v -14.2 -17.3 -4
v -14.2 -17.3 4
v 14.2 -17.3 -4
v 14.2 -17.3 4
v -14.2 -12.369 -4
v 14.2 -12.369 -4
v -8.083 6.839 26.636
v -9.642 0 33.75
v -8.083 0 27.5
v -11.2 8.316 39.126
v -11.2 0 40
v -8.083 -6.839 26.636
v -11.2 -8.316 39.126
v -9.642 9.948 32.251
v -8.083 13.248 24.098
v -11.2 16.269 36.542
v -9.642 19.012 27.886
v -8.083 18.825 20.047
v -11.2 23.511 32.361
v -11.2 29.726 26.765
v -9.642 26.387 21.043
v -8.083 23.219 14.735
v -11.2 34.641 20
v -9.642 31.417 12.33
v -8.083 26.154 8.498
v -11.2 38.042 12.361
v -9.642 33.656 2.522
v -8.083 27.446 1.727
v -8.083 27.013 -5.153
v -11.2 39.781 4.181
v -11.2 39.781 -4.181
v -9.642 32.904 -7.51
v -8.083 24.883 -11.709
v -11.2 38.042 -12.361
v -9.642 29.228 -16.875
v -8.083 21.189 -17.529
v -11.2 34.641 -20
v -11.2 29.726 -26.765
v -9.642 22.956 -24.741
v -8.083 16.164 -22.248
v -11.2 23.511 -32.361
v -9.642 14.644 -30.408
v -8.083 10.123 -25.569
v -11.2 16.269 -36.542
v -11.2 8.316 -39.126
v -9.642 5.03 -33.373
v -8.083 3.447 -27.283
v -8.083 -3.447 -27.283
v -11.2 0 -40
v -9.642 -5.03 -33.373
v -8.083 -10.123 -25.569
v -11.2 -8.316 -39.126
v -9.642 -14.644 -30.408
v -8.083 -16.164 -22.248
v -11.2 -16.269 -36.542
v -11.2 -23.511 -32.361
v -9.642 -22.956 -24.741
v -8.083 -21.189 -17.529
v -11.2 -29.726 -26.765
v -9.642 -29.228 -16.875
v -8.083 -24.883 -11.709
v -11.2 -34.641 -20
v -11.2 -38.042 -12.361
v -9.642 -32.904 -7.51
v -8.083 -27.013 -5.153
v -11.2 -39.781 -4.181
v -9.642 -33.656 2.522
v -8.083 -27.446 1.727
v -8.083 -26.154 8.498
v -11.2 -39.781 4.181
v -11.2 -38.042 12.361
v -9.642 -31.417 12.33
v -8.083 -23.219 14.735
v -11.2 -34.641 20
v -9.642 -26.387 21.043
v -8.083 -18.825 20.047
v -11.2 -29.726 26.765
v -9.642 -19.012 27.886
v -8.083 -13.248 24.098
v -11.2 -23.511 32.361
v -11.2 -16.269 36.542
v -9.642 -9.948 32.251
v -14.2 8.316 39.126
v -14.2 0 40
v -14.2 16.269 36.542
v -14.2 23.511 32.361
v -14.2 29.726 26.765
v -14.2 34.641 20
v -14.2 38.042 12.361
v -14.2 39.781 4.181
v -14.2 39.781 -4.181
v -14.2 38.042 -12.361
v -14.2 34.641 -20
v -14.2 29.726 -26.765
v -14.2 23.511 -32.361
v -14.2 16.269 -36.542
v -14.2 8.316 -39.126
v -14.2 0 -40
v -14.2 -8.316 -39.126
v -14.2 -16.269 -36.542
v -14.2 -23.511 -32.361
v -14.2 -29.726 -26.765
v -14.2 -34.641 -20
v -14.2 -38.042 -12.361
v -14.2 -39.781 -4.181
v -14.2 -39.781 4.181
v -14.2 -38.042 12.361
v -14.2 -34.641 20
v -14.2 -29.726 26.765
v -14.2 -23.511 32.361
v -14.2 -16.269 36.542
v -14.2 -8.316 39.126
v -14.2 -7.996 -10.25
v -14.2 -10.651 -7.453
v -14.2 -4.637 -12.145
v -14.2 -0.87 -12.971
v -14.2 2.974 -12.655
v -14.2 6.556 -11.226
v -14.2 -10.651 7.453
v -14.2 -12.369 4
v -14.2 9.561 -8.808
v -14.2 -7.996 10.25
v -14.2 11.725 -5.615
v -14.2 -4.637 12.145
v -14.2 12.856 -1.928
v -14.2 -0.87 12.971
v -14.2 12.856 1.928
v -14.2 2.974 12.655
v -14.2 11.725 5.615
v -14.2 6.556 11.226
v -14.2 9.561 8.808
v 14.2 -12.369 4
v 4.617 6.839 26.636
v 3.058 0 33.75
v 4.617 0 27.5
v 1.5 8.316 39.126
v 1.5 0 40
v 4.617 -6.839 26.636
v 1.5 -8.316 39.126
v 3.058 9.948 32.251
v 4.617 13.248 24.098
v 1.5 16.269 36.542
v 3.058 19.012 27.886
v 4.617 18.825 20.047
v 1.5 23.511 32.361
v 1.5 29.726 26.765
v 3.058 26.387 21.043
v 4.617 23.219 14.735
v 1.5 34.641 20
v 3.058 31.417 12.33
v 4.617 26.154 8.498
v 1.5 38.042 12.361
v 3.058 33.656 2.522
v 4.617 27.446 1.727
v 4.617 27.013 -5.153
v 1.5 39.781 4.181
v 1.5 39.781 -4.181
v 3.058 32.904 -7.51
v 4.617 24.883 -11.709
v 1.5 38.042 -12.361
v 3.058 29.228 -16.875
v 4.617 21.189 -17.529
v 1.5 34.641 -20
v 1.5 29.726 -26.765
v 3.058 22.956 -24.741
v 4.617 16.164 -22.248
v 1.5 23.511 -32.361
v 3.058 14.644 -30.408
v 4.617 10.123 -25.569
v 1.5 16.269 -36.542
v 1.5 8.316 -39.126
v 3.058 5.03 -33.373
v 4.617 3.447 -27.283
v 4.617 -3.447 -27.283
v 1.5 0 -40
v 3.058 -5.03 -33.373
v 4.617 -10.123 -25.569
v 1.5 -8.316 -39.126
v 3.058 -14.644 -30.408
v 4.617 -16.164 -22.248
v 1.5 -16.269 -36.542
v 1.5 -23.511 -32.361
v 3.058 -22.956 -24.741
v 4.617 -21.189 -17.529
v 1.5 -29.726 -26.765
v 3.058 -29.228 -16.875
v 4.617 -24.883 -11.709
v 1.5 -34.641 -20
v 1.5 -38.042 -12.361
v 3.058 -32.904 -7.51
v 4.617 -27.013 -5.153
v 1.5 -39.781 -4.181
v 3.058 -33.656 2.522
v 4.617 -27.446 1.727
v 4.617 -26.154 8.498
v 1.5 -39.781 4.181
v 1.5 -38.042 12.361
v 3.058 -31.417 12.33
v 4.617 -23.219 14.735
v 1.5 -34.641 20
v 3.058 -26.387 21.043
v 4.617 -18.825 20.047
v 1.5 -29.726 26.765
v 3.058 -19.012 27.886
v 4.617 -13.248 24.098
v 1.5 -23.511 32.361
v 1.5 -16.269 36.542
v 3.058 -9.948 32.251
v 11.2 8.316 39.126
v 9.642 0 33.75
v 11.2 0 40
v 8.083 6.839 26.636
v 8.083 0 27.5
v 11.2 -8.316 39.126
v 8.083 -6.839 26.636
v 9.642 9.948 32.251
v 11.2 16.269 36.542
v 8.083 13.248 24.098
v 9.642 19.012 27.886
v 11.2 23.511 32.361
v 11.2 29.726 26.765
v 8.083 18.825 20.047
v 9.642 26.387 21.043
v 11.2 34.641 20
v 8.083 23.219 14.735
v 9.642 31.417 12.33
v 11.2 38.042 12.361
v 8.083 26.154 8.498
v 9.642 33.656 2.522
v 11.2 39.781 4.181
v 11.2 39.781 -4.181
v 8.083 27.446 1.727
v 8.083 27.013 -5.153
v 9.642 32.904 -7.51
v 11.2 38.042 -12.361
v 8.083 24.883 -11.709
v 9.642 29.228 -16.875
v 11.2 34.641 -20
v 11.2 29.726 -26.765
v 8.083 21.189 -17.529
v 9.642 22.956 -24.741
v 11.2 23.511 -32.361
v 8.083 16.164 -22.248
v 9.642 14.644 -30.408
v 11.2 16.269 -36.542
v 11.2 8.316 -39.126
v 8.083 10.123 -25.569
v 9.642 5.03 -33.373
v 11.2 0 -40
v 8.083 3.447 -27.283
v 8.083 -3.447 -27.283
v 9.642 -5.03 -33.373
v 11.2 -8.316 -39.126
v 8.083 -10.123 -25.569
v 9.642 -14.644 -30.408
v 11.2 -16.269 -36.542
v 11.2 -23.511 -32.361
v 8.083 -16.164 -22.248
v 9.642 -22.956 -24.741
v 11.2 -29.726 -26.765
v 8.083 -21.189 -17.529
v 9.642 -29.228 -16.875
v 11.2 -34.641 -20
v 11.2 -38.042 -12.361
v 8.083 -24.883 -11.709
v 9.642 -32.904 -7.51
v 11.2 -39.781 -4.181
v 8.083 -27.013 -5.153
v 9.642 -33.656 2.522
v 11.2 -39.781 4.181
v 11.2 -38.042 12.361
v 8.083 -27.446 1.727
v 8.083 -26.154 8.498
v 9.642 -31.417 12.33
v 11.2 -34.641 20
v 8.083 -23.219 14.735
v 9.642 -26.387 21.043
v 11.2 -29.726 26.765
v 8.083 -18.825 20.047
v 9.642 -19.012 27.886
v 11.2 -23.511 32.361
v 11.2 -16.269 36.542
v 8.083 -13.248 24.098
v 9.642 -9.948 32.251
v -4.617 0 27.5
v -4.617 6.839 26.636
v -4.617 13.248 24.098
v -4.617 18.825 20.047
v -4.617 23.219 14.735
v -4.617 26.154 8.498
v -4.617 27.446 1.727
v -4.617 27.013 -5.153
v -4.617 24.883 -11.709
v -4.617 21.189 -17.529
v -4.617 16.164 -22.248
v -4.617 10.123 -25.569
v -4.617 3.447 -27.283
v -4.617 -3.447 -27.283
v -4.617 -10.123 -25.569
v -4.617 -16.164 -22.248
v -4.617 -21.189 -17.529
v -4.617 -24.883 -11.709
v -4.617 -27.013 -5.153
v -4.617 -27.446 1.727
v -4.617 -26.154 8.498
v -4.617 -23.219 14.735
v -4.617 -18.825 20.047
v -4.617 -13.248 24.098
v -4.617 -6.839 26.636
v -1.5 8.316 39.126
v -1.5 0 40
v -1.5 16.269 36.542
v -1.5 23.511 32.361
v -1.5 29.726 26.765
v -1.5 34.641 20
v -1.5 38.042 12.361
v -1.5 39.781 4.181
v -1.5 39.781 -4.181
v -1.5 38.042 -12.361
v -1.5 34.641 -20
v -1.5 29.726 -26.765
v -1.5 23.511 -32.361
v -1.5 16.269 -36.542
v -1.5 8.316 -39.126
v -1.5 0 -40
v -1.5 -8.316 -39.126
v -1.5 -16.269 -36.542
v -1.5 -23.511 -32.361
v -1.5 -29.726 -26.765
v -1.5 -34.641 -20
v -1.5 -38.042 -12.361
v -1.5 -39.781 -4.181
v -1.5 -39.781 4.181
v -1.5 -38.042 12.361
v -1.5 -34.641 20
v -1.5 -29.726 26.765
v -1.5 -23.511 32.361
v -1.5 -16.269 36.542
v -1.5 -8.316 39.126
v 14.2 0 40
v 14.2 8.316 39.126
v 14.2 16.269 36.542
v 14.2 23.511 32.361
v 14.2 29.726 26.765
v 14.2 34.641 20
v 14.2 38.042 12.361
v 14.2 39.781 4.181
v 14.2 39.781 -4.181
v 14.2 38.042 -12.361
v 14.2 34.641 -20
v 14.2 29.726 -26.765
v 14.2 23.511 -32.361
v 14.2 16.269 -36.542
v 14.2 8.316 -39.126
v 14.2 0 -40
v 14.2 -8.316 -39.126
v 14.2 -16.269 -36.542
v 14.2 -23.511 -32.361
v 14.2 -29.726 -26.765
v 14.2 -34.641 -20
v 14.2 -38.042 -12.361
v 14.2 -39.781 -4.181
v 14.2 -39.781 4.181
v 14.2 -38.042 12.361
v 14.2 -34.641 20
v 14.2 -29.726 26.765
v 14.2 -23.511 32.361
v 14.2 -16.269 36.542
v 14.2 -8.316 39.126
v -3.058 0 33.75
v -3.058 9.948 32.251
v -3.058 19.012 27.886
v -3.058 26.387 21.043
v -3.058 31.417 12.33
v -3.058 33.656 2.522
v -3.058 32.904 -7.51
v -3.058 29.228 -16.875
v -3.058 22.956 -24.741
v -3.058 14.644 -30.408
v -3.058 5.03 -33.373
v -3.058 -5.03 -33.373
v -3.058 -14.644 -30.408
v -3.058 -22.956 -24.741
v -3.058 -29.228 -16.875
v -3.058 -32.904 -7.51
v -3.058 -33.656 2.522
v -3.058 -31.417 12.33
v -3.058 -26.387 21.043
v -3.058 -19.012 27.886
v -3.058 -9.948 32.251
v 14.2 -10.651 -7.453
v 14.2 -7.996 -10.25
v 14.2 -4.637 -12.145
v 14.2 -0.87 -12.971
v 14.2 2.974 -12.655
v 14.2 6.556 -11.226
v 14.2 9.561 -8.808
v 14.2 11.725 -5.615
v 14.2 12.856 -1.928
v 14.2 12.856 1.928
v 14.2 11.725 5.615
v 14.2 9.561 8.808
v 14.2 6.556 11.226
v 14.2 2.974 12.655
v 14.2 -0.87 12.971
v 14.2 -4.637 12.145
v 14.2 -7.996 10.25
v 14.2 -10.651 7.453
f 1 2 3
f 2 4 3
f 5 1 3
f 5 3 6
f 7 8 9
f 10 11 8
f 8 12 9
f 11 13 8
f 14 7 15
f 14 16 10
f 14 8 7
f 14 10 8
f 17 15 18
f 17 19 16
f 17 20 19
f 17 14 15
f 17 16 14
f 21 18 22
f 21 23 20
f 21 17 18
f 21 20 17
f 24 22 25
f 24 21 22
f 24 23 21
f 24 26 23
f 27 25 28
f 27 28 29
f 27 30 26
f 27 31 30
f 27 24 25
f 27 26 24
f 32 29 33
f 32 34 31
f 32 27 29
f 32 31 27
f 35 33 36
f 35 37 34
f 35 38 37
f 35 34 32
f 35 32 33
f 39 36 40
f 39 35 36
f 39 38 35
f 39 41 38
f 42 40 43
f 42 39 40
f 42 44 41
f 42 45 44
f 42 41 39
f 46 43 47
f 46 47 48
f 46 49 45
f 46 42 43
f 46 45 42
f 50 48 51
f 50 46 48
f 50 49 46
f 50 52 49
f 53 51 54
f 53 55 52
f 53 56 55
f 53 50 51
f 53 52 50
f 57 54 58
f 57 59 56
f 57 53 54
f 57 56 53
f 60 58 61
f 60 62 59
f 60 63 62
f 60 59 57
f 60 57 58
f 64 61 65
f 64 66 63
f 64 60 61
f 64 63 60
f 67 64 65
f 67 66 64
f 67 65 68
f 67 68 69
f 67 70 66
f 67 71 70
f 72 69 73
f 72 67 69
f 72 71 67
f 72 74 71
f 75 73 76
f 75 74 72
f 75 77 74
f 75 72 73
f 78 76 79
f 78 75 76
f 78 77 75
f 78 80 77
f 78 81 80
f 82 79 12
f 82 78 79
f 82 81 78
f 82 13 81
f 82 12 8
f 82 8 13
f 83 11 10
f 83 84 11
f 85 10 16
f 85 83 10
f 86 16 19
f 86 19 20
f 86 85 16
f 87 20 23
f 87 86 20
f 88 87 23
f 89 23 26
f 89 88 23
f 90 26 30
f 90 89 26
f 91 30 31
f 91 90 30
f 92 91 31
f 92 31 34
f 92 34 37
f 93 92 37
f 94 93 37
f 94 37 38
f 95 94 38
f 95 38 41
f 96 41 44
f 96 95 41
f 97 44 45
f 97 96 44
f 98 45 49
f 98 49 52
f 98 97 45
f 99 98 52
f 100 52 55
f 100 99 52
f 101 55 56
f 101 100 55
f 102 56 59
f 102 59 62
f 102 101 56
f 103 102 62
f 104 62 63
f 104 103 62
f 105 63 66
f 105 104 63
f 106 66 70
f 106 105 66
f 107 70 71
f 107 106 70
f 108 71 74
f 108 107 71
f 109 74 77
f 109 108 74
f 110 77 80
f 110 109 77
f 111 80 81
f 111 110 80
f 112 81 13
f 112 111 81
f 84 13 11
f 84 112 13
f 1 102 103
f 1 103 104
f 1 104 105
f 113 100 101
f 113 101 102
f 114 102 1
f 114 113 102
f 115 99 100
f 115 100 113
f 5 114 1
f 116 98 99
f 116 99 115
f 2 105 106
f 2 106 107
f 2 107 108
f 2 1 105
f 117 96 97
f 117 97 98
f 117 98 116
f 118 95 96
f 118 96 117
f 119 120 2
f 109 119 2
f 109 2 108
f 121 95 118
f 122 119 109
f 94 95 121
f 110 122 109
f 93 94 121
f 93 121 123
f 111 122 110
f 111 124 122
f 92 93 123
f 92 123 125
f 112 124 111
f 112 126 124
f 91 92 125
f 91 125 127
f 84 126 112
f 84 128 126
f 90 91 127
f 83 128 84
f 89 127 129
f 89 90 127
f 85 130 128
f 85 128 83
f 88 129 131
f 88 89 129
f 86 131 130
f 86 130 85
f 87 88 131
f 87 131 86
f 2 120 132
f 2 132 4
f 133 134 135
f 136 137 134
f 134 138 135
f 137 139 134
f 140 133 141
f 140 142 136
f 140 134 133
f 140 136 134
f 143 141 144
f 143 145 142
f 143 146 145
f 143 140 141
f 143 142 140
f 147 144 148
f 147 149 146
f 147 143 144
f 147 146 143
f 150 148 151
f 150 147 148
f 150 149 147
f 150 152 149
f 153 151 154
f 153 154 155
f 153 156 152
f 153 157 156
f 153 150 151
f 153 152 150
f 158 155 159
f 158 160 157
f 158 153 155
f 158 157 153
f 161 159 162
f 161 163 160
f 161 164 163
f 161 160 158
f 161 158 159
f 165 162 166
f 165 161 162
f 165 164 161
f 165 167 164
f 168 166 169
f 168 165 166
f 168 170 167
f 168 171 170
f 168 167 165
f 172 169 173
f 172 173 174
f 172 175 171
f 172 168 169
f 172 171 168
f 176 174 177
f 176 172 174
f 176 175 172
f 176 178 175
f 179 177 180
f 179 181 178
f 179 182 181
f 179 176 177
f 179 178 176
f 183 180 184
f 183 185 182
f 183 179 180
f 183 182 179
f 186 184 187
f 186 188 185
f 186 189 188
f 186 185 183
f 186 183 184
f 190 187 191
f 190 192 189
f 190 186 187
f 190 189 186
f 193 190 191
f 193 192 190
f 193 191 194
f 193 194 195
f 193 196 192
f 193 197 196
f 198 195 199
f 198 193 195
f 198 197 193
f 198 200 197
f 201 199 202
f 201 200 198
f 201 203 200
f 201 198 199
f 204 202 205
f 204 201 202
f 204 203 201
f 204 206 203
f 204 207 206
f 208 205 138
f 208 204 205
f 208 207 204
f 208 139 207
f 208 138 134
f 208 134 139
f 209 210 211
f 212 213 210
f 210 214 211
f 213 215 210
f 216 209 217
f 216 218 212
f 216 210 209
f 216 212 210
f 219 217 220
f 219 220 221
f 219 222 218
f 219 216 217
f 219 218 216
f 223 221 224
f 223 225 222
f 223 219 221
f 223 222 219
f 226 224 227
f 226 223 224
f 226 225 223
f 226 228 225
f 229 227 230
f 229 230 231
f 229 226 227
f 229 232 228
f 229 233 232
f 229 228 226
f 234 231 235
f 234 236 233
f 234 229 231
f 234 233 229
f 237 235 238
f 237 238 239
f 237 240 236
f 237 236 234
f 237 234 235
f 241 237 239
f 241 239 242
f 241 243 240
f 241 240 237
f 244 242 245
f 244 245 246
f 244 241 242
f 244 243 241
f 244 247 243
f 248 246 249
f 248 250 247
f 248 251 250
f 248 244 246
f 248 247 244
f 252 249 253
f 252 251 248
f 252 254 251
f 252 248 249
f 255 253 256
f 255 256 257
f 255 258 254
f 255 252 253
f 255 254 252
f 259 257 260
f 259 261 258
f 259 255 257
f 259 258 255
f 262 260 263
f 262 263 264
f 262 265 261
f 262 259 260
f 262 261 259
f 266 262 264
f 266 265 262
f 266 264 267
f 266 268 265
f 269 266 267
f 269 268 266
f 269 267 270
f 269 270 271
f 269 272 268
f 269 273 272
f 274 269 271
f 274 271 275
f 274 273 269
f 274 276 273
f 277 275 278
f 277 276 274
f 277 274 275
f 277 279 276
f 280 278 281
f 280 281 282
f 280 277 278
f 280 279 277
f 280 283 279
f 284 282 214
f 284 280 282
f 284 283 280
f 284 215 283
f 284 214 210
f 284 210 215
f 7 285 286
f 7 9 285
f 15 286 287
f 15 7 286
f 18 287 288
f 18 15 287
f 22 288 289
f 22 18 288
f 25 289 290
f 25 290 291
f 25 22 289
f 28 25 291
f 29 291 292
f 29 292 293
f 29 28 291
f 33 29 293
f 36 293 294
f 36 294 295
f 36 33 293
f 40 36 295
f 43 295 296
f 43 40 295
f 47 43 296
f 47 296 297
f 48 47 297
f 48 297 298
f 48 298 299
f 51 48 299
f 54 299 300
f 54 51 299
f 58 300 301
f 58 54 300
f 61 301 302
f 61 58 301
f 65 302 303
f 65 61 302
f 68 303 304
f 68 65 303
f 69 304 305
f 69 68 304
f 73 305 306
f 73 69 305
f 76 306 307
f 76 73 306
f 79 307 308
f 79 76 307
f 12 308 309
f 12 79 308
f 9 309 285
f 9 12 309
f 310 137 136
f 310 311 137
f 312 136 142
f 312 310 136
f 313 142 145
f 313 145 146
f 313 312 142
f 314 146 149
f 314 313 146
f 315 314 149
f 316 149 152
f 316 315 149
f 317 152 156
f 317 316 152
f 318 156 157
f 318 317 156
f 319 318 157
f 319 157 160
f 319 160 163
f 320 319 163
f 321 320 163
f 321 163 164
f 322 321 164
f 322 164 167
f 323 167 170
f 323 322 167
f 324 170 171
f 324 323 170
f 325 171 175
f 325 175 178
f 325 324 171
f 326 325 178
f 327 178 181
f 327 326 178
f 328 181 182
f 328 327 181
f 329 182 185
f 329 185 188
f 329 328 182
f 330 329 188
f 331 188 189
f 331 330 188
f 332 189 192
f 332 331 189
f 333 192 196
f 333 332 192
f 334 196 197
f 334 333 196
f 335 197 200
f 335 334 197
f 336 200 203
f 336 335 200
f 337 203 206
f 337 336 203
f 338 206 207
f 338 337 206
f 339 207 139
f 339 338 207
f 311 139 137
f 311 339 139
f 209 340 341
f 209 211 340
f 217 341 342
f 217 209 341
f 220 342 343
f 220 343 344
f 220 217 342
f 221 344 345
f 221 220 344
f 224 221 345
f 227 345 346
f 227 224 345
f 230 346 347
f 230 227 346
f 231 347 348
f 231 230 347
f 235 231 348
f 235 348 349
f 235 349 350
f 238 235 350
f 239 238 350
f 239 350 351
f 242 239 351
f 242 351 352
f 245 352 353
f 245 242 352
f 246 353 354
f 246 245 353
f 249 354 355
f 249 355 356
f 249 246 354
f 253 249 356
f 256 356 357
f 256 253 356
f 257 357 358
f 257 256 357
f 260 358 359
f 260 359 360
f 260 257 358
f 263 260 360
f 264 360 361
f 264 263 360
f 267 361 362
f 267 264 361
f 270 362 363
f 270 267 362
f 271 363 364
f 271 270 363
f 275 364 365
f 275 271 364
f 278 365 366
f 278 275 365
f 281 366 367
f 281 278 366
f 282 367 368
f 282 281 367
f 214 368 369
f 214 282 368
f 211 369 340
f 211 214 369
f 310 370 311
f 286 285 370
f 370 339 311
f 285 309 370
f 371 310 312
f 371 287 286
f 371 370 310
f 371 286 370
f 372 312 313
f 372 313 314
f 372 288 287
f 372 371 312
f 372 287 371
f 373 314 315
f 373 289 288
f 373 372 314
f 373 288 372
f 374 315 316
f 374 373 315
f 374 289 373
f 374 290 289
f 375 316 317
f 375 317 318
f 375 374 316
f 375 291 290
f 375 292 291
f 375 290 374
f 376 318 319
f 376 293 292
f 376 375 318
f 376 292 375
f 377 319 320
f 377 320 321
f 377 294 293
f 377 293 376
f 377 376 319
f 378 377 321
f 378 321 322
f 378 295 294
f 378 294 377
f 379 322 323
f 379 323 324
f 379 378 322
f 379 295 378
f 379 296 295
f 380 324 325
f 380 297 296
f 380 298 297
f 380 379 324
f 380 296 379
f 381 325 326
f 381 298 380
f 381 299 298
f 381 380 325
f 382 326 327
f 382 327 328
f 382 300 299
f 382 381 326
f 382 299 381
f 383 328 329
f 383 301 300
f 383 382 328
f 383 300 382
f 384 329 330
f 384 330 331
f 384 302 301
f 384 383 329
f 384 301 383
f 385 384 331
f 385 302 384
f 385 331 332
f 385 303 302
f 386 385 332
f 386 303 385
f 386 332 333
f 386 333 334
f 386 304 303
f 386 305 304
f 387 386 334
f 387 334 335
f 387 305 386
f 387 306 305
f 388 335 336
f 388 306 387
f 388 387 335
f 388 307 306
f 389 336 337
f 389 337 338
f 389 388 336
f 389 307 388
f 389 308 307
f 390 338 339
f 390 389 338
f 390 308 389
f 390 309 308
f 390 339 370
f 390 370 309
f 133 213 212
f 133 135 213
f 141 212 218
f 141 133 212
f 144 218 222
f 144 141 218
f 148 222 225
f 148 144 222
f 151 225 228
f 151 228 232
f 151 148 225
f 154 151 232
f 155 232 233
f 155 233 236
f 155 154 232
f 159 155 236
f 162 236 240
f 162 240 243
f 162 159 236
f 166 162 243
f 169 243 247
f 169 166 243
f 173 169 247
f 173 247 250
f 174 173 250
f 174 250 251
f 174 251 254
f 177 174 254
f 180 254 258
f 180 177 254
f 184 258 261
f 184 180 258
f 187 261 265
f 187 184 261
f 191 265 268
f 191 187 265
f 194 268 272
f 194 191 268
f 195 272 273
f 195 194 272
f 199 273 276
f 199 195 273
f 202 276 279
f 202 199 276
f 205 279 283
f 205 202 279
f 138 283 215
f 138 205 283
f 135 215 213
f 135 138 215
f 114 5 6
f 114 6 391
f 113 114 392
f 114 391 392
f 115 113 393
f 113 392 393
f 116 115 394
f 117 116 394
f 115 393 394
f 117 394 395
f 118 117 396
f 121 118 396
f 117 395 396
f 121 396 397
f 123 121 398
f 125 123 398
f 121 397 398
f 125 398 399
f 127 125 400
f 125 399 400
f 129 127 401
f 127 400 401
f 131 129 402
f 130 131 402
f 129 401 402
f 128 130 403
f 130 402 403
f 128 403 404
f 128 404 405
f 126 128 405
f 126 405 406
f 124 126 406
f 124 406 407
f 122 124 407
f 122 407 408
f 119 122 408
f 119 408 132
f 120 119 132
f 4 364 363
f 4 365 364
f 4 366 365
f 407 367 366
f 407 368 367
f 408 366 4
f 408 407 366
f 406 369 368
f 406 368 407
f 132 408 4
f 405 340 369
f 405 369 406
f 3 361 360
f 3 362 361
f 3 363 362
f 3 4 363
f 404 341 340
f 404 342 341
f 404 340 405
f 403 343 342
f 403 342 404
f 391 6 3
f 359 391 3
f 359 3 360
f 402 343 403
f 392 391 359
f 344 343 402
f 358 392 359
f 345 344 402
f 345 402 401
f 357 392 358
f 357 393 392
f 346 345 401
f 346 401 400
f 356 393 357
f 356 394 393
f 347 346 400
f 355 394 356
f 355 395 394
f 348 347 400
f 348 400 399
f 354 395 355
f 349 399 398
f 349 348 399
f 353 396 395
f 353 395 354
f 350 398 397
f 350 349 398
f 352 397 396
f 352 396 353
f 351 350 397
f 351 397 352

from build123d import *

# Parameters (mm, degrees)
F3_DEPTH = 14.2


with BuildPart() as f2:
    # F1 (on Front) → F2 (revolve)
    with BuildSketch(Plane.XZ):
        Polygon((-14.2, 40), (-14.2, 0), (14.2, 0), (14.2, 40), (11.2, 40), (8.0834, 27.5), (4.6166, 27.5), (1.5, 40), (-1.5, 40), (-4.6166, 27.5), (-8.0834, 27.5), (-11.2, 40), align=None)
    revolve(axis=Axis((0, 0, 0), (-1, 0, 0)))

    # F0 (on Right) → F3 (cut, symmetric)
    with BuildSketch(Plane.YZ):
        with BuildLine():
            Line((-17.3, -4), (-12.369317, -4))
            ThreePointArc((-12.369317, -4), (13, 0), (-12.369317, 4))
            Line((-12.369317, 4), (-17.3, 4))
            Line((-17.3, 4), (-17.3, -4))
        make_face()
    extrude(amount=F3_DEPTH, both=True, mode=Mode.SUBTRACT)


solid = f2.part
